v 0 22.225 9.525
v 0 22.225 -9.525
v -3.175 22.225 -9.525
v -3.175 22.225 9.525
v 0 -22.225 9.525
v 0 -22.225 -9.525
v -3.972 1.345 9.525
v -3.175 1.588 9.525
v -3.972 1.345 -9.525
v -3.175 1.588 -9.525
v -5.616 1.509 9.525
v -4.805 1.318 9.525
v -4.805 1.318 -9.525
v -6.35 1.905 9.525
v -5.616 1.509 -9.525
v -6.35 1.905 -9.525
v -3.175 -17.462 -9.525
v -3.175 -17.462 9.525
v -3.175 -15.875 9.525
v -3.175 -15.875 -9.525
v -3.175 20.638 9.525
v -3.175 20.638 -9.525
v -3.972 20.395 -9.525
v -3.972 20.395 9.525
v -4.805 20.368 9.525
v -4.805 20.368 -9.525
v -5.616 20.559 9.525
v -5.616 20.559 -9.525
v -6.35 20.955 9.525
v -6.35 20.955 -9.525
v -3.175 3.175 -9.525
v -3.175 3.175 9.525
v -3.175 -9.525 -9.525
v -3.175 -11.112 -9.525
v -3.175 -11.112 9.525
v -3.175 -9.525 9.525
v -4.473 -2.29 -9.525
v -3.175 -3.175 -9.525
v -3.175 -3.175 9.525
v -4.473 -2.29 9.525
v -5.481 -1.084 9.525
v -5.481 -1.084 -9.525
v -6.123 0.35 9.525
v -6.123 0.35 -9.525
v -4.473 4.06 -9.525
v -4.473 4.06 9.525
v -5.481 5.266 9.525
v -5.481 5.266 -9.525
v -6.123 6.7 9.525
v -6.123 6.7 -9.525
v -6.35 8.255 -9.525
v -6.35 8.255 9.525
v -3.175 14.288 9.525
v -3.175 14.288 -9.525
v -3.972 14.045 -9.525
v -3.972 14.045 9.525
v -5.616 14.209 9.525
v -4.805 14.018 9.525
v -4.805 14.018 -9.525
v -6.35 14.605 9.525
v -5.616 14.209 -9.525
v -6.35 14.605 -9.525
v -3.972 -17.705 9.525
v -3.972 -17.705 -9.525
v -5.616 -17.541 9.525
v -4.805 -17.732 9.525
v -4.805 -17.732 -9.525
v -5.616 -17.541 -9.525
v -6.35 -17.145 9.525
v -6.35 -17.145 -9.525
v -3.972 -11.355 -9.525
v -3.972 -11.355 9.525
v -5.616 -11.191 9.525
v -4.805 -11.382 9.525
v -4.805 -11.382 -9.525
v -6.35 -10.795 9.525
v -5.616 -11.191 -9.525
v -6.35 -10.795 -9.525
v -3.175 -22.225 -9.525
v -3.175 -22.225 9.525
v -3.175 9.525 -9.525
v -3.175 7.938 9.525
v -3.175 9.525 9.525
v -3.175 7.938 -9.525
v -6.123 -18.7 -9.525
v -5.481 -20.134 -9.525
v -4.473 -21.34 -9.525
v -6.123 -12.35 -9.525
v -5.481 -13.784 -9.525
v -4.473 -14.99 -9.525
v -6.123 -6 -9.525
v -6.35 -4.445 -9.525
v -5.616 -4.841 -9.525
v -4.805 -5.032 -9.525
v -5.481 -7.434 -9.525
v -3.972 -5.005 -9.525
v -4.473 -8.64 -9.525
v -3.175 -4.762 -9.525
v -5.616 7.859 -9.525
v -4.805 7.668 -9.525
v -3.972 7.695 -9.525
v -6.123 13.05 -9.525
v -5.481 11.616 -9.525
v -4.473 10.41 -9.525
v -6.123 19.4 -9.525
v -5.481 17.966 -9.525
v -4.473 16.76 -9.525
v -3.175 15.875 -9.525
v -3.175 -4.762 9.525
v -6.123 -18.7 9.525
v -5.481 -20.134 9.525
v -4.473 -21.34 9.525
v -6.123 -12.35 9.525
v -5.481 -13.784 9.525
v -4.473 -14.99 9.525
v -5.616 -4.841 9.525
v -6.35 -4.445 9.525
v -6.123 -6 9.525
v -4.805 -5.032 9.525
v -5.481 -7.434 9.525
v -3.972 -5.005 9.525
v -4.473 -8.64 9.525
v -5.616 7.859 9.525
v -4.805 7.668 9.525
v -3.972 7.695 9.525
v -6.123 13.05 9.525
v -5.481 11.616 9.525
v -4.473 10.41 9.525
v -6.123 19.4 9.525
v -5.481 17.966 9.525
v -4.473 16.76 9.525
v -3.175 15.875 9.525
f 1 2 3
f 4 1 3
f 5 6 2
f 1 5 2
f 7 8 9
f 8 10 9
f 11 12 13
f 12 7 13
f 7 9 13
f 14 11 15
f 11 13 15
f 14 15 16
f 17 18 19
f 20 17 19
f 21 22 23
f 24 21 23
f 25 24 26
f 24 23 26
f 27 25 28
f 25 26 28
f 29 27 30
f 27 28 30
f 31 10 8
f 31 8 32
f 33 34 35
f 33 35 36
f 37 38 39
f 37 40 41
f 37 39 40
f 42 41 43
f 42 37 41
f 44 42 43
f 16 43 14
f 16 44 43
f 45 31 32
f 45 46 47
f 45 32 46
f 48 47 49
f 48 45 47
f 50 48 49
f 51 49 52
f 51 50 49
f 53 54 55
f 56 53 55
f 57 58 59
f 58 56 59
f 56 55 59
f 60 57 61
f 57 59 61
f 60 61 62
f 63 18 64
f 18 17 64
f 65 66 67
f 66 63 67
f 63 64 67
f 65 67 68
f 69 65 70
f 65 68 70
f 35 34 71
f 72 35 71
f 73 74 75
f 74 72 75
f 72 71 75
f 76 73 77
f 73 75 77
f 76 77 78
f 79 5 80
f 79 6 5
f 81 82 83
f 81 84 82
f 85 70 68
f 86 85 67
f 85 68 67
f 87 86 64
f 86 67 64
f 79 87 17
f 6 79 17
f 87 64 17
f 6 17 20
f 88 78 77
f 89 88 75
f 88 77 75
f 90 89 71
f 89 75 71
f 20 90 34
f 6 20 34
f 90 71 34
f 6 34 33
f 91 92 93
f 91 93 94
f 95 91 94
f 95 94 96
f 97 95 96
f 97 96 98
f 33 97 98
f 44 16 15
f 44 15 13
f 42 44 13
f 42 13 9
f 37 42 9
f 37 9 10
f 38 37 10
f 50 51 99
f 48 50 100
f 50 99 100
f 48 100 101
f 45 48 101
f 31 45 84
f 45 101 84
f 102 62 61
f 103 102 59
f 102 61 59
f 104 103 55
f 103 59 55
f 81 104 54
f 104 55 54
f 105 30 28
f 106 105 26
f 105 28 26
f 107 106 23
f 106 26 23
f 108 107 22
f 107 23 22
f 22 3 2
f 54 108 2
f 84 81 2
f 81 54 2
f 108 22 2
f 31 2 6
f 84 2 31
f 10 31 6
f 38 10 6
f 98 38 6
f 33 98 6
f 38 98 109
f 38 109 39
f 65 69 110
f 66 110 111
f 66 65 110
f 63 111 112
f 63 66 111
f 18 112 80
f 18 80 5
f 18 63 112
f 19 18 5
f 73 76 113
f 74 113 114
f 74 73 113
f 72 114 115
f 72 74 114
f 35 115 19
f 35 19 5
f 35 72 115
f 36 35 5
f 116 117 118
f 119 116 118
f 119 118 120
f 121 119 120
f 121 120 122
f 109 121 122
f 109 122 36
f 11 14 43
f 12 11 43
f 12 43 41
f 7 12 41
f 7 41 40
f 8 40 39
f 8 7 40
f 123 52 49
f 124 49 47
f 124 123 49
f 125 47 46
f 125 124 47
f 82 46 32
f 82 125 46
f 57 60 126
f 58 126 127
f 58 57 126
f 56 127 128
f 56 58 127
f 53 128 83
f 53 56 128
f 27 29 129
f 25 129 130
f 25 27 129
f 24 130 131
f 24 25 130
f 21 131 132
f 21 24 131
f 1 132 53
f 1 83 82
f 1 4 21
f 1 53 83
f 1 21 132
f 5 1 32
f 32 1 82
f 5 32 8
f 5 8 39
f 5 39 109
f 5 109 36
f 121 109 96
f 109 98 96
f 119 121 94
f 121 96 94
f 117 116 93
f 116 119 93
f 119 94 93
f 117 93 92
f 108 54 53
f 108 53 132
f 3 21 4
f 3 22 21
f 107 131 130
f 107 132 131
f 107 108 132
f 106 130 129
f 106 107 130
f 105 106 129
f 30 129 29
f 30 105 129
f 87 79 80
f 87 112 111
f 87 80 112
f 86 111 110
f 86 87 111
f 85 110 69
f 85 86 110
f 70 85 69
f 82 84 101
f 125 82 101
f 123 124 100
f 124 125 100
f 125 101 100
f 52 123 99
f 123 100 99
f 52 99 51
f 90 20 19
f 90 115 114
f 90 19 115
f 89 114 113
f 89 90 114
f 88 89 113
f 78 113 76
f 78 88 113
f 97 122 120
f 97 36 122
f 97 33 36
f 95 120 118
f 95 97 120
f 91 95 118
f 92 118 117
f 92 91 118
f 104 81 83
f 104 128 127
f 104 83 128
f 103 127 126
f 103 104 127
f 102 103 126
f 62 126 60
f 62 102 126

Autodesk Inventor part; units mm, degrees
ref_plane "YZ Plane" through (0, 0, 0) normal (1, 0, 0) x (0, 1, 0)
ref_plane "XZ Plane" through (0, 0, 0) normal (0, 1, 0) x (-1, 0, 0)
ref_plane "XY Plane" through (0, 0, 0) normal (0, 0, 1) x (1, 0, 0)
sketch "Sketch1" plane through (0, 0, 0) normal (0, 0, 1) x (1, 0, 0)
  line L0 (-3.81, 0) -> (0.635, 0) projected
  line L1 (0, -31.115) -> (0, 31.115) projected
  line L2 (0, -22.225) -> (0, 22.225)
  line L3 (0, -22.225) -> (-3.175, -22.225)
  line L4 (0, 22.225) -> (-3.175, 22.225)
  line L5 (-3.175, 22.225) -> (-3.175, -22.225) construction
  line L6 (-3.175, -22.225) -> (-3.175, 22.225)
  point P0 (0, 0)
  point P1 (0, 0)
  point P2 (-3.175, -18.1789)
  dimension "d0" = 44.45
  dimension "d3" = 3.175
extrude "Extrusion1" add sketch "Sketch1" along normal mid plane 19.05
sketch "Sketch2" plane through (0, 0, 0) normal (0, 0, 1) x (1, 0, 0)
  line L0 (-3.175, -22.225) -> (-3.175, 22.225) projected
  line L1 (0, -22.225) -> (-3.175, -22.225) projected
  line L2 (0, 22.225) -> (0, -22.225) projected
  line L3 (-3.175, 22.225) -> (0, 22.225) projected
  line L4 (-6.35, -22.225) -> (-6.35, 22.225) construction
  arc A0 (-6.35, -17.145) -> (-3.175, -22.225) centre (-0.6351, -17.1054) ccw
  arc A1 (-6.35, -17.145) -> (-3.175, -17.4625) centre (-4.4894, -14.5723) ccw
  line L5 (-6.35, -17.145) -> (0, -17.145) construction
  point P0 (0, 0)
  dimension "d10" = 3.175
  dimension "d11" = 5.08
  dimension "d12" = 5.715
  dimension "d14" = 3.175
  dimension "d15" = 0.3175
extrude "Extrusion2" add sketch "Sketch2" along normal mid plane 19.05 contours A0 A1 L0
pattern_linear "Rectangular Pattern1" count 7 spacing 6.35 along (0, 1, 0) of "Extrusion2"
properties part number "ratchet"
